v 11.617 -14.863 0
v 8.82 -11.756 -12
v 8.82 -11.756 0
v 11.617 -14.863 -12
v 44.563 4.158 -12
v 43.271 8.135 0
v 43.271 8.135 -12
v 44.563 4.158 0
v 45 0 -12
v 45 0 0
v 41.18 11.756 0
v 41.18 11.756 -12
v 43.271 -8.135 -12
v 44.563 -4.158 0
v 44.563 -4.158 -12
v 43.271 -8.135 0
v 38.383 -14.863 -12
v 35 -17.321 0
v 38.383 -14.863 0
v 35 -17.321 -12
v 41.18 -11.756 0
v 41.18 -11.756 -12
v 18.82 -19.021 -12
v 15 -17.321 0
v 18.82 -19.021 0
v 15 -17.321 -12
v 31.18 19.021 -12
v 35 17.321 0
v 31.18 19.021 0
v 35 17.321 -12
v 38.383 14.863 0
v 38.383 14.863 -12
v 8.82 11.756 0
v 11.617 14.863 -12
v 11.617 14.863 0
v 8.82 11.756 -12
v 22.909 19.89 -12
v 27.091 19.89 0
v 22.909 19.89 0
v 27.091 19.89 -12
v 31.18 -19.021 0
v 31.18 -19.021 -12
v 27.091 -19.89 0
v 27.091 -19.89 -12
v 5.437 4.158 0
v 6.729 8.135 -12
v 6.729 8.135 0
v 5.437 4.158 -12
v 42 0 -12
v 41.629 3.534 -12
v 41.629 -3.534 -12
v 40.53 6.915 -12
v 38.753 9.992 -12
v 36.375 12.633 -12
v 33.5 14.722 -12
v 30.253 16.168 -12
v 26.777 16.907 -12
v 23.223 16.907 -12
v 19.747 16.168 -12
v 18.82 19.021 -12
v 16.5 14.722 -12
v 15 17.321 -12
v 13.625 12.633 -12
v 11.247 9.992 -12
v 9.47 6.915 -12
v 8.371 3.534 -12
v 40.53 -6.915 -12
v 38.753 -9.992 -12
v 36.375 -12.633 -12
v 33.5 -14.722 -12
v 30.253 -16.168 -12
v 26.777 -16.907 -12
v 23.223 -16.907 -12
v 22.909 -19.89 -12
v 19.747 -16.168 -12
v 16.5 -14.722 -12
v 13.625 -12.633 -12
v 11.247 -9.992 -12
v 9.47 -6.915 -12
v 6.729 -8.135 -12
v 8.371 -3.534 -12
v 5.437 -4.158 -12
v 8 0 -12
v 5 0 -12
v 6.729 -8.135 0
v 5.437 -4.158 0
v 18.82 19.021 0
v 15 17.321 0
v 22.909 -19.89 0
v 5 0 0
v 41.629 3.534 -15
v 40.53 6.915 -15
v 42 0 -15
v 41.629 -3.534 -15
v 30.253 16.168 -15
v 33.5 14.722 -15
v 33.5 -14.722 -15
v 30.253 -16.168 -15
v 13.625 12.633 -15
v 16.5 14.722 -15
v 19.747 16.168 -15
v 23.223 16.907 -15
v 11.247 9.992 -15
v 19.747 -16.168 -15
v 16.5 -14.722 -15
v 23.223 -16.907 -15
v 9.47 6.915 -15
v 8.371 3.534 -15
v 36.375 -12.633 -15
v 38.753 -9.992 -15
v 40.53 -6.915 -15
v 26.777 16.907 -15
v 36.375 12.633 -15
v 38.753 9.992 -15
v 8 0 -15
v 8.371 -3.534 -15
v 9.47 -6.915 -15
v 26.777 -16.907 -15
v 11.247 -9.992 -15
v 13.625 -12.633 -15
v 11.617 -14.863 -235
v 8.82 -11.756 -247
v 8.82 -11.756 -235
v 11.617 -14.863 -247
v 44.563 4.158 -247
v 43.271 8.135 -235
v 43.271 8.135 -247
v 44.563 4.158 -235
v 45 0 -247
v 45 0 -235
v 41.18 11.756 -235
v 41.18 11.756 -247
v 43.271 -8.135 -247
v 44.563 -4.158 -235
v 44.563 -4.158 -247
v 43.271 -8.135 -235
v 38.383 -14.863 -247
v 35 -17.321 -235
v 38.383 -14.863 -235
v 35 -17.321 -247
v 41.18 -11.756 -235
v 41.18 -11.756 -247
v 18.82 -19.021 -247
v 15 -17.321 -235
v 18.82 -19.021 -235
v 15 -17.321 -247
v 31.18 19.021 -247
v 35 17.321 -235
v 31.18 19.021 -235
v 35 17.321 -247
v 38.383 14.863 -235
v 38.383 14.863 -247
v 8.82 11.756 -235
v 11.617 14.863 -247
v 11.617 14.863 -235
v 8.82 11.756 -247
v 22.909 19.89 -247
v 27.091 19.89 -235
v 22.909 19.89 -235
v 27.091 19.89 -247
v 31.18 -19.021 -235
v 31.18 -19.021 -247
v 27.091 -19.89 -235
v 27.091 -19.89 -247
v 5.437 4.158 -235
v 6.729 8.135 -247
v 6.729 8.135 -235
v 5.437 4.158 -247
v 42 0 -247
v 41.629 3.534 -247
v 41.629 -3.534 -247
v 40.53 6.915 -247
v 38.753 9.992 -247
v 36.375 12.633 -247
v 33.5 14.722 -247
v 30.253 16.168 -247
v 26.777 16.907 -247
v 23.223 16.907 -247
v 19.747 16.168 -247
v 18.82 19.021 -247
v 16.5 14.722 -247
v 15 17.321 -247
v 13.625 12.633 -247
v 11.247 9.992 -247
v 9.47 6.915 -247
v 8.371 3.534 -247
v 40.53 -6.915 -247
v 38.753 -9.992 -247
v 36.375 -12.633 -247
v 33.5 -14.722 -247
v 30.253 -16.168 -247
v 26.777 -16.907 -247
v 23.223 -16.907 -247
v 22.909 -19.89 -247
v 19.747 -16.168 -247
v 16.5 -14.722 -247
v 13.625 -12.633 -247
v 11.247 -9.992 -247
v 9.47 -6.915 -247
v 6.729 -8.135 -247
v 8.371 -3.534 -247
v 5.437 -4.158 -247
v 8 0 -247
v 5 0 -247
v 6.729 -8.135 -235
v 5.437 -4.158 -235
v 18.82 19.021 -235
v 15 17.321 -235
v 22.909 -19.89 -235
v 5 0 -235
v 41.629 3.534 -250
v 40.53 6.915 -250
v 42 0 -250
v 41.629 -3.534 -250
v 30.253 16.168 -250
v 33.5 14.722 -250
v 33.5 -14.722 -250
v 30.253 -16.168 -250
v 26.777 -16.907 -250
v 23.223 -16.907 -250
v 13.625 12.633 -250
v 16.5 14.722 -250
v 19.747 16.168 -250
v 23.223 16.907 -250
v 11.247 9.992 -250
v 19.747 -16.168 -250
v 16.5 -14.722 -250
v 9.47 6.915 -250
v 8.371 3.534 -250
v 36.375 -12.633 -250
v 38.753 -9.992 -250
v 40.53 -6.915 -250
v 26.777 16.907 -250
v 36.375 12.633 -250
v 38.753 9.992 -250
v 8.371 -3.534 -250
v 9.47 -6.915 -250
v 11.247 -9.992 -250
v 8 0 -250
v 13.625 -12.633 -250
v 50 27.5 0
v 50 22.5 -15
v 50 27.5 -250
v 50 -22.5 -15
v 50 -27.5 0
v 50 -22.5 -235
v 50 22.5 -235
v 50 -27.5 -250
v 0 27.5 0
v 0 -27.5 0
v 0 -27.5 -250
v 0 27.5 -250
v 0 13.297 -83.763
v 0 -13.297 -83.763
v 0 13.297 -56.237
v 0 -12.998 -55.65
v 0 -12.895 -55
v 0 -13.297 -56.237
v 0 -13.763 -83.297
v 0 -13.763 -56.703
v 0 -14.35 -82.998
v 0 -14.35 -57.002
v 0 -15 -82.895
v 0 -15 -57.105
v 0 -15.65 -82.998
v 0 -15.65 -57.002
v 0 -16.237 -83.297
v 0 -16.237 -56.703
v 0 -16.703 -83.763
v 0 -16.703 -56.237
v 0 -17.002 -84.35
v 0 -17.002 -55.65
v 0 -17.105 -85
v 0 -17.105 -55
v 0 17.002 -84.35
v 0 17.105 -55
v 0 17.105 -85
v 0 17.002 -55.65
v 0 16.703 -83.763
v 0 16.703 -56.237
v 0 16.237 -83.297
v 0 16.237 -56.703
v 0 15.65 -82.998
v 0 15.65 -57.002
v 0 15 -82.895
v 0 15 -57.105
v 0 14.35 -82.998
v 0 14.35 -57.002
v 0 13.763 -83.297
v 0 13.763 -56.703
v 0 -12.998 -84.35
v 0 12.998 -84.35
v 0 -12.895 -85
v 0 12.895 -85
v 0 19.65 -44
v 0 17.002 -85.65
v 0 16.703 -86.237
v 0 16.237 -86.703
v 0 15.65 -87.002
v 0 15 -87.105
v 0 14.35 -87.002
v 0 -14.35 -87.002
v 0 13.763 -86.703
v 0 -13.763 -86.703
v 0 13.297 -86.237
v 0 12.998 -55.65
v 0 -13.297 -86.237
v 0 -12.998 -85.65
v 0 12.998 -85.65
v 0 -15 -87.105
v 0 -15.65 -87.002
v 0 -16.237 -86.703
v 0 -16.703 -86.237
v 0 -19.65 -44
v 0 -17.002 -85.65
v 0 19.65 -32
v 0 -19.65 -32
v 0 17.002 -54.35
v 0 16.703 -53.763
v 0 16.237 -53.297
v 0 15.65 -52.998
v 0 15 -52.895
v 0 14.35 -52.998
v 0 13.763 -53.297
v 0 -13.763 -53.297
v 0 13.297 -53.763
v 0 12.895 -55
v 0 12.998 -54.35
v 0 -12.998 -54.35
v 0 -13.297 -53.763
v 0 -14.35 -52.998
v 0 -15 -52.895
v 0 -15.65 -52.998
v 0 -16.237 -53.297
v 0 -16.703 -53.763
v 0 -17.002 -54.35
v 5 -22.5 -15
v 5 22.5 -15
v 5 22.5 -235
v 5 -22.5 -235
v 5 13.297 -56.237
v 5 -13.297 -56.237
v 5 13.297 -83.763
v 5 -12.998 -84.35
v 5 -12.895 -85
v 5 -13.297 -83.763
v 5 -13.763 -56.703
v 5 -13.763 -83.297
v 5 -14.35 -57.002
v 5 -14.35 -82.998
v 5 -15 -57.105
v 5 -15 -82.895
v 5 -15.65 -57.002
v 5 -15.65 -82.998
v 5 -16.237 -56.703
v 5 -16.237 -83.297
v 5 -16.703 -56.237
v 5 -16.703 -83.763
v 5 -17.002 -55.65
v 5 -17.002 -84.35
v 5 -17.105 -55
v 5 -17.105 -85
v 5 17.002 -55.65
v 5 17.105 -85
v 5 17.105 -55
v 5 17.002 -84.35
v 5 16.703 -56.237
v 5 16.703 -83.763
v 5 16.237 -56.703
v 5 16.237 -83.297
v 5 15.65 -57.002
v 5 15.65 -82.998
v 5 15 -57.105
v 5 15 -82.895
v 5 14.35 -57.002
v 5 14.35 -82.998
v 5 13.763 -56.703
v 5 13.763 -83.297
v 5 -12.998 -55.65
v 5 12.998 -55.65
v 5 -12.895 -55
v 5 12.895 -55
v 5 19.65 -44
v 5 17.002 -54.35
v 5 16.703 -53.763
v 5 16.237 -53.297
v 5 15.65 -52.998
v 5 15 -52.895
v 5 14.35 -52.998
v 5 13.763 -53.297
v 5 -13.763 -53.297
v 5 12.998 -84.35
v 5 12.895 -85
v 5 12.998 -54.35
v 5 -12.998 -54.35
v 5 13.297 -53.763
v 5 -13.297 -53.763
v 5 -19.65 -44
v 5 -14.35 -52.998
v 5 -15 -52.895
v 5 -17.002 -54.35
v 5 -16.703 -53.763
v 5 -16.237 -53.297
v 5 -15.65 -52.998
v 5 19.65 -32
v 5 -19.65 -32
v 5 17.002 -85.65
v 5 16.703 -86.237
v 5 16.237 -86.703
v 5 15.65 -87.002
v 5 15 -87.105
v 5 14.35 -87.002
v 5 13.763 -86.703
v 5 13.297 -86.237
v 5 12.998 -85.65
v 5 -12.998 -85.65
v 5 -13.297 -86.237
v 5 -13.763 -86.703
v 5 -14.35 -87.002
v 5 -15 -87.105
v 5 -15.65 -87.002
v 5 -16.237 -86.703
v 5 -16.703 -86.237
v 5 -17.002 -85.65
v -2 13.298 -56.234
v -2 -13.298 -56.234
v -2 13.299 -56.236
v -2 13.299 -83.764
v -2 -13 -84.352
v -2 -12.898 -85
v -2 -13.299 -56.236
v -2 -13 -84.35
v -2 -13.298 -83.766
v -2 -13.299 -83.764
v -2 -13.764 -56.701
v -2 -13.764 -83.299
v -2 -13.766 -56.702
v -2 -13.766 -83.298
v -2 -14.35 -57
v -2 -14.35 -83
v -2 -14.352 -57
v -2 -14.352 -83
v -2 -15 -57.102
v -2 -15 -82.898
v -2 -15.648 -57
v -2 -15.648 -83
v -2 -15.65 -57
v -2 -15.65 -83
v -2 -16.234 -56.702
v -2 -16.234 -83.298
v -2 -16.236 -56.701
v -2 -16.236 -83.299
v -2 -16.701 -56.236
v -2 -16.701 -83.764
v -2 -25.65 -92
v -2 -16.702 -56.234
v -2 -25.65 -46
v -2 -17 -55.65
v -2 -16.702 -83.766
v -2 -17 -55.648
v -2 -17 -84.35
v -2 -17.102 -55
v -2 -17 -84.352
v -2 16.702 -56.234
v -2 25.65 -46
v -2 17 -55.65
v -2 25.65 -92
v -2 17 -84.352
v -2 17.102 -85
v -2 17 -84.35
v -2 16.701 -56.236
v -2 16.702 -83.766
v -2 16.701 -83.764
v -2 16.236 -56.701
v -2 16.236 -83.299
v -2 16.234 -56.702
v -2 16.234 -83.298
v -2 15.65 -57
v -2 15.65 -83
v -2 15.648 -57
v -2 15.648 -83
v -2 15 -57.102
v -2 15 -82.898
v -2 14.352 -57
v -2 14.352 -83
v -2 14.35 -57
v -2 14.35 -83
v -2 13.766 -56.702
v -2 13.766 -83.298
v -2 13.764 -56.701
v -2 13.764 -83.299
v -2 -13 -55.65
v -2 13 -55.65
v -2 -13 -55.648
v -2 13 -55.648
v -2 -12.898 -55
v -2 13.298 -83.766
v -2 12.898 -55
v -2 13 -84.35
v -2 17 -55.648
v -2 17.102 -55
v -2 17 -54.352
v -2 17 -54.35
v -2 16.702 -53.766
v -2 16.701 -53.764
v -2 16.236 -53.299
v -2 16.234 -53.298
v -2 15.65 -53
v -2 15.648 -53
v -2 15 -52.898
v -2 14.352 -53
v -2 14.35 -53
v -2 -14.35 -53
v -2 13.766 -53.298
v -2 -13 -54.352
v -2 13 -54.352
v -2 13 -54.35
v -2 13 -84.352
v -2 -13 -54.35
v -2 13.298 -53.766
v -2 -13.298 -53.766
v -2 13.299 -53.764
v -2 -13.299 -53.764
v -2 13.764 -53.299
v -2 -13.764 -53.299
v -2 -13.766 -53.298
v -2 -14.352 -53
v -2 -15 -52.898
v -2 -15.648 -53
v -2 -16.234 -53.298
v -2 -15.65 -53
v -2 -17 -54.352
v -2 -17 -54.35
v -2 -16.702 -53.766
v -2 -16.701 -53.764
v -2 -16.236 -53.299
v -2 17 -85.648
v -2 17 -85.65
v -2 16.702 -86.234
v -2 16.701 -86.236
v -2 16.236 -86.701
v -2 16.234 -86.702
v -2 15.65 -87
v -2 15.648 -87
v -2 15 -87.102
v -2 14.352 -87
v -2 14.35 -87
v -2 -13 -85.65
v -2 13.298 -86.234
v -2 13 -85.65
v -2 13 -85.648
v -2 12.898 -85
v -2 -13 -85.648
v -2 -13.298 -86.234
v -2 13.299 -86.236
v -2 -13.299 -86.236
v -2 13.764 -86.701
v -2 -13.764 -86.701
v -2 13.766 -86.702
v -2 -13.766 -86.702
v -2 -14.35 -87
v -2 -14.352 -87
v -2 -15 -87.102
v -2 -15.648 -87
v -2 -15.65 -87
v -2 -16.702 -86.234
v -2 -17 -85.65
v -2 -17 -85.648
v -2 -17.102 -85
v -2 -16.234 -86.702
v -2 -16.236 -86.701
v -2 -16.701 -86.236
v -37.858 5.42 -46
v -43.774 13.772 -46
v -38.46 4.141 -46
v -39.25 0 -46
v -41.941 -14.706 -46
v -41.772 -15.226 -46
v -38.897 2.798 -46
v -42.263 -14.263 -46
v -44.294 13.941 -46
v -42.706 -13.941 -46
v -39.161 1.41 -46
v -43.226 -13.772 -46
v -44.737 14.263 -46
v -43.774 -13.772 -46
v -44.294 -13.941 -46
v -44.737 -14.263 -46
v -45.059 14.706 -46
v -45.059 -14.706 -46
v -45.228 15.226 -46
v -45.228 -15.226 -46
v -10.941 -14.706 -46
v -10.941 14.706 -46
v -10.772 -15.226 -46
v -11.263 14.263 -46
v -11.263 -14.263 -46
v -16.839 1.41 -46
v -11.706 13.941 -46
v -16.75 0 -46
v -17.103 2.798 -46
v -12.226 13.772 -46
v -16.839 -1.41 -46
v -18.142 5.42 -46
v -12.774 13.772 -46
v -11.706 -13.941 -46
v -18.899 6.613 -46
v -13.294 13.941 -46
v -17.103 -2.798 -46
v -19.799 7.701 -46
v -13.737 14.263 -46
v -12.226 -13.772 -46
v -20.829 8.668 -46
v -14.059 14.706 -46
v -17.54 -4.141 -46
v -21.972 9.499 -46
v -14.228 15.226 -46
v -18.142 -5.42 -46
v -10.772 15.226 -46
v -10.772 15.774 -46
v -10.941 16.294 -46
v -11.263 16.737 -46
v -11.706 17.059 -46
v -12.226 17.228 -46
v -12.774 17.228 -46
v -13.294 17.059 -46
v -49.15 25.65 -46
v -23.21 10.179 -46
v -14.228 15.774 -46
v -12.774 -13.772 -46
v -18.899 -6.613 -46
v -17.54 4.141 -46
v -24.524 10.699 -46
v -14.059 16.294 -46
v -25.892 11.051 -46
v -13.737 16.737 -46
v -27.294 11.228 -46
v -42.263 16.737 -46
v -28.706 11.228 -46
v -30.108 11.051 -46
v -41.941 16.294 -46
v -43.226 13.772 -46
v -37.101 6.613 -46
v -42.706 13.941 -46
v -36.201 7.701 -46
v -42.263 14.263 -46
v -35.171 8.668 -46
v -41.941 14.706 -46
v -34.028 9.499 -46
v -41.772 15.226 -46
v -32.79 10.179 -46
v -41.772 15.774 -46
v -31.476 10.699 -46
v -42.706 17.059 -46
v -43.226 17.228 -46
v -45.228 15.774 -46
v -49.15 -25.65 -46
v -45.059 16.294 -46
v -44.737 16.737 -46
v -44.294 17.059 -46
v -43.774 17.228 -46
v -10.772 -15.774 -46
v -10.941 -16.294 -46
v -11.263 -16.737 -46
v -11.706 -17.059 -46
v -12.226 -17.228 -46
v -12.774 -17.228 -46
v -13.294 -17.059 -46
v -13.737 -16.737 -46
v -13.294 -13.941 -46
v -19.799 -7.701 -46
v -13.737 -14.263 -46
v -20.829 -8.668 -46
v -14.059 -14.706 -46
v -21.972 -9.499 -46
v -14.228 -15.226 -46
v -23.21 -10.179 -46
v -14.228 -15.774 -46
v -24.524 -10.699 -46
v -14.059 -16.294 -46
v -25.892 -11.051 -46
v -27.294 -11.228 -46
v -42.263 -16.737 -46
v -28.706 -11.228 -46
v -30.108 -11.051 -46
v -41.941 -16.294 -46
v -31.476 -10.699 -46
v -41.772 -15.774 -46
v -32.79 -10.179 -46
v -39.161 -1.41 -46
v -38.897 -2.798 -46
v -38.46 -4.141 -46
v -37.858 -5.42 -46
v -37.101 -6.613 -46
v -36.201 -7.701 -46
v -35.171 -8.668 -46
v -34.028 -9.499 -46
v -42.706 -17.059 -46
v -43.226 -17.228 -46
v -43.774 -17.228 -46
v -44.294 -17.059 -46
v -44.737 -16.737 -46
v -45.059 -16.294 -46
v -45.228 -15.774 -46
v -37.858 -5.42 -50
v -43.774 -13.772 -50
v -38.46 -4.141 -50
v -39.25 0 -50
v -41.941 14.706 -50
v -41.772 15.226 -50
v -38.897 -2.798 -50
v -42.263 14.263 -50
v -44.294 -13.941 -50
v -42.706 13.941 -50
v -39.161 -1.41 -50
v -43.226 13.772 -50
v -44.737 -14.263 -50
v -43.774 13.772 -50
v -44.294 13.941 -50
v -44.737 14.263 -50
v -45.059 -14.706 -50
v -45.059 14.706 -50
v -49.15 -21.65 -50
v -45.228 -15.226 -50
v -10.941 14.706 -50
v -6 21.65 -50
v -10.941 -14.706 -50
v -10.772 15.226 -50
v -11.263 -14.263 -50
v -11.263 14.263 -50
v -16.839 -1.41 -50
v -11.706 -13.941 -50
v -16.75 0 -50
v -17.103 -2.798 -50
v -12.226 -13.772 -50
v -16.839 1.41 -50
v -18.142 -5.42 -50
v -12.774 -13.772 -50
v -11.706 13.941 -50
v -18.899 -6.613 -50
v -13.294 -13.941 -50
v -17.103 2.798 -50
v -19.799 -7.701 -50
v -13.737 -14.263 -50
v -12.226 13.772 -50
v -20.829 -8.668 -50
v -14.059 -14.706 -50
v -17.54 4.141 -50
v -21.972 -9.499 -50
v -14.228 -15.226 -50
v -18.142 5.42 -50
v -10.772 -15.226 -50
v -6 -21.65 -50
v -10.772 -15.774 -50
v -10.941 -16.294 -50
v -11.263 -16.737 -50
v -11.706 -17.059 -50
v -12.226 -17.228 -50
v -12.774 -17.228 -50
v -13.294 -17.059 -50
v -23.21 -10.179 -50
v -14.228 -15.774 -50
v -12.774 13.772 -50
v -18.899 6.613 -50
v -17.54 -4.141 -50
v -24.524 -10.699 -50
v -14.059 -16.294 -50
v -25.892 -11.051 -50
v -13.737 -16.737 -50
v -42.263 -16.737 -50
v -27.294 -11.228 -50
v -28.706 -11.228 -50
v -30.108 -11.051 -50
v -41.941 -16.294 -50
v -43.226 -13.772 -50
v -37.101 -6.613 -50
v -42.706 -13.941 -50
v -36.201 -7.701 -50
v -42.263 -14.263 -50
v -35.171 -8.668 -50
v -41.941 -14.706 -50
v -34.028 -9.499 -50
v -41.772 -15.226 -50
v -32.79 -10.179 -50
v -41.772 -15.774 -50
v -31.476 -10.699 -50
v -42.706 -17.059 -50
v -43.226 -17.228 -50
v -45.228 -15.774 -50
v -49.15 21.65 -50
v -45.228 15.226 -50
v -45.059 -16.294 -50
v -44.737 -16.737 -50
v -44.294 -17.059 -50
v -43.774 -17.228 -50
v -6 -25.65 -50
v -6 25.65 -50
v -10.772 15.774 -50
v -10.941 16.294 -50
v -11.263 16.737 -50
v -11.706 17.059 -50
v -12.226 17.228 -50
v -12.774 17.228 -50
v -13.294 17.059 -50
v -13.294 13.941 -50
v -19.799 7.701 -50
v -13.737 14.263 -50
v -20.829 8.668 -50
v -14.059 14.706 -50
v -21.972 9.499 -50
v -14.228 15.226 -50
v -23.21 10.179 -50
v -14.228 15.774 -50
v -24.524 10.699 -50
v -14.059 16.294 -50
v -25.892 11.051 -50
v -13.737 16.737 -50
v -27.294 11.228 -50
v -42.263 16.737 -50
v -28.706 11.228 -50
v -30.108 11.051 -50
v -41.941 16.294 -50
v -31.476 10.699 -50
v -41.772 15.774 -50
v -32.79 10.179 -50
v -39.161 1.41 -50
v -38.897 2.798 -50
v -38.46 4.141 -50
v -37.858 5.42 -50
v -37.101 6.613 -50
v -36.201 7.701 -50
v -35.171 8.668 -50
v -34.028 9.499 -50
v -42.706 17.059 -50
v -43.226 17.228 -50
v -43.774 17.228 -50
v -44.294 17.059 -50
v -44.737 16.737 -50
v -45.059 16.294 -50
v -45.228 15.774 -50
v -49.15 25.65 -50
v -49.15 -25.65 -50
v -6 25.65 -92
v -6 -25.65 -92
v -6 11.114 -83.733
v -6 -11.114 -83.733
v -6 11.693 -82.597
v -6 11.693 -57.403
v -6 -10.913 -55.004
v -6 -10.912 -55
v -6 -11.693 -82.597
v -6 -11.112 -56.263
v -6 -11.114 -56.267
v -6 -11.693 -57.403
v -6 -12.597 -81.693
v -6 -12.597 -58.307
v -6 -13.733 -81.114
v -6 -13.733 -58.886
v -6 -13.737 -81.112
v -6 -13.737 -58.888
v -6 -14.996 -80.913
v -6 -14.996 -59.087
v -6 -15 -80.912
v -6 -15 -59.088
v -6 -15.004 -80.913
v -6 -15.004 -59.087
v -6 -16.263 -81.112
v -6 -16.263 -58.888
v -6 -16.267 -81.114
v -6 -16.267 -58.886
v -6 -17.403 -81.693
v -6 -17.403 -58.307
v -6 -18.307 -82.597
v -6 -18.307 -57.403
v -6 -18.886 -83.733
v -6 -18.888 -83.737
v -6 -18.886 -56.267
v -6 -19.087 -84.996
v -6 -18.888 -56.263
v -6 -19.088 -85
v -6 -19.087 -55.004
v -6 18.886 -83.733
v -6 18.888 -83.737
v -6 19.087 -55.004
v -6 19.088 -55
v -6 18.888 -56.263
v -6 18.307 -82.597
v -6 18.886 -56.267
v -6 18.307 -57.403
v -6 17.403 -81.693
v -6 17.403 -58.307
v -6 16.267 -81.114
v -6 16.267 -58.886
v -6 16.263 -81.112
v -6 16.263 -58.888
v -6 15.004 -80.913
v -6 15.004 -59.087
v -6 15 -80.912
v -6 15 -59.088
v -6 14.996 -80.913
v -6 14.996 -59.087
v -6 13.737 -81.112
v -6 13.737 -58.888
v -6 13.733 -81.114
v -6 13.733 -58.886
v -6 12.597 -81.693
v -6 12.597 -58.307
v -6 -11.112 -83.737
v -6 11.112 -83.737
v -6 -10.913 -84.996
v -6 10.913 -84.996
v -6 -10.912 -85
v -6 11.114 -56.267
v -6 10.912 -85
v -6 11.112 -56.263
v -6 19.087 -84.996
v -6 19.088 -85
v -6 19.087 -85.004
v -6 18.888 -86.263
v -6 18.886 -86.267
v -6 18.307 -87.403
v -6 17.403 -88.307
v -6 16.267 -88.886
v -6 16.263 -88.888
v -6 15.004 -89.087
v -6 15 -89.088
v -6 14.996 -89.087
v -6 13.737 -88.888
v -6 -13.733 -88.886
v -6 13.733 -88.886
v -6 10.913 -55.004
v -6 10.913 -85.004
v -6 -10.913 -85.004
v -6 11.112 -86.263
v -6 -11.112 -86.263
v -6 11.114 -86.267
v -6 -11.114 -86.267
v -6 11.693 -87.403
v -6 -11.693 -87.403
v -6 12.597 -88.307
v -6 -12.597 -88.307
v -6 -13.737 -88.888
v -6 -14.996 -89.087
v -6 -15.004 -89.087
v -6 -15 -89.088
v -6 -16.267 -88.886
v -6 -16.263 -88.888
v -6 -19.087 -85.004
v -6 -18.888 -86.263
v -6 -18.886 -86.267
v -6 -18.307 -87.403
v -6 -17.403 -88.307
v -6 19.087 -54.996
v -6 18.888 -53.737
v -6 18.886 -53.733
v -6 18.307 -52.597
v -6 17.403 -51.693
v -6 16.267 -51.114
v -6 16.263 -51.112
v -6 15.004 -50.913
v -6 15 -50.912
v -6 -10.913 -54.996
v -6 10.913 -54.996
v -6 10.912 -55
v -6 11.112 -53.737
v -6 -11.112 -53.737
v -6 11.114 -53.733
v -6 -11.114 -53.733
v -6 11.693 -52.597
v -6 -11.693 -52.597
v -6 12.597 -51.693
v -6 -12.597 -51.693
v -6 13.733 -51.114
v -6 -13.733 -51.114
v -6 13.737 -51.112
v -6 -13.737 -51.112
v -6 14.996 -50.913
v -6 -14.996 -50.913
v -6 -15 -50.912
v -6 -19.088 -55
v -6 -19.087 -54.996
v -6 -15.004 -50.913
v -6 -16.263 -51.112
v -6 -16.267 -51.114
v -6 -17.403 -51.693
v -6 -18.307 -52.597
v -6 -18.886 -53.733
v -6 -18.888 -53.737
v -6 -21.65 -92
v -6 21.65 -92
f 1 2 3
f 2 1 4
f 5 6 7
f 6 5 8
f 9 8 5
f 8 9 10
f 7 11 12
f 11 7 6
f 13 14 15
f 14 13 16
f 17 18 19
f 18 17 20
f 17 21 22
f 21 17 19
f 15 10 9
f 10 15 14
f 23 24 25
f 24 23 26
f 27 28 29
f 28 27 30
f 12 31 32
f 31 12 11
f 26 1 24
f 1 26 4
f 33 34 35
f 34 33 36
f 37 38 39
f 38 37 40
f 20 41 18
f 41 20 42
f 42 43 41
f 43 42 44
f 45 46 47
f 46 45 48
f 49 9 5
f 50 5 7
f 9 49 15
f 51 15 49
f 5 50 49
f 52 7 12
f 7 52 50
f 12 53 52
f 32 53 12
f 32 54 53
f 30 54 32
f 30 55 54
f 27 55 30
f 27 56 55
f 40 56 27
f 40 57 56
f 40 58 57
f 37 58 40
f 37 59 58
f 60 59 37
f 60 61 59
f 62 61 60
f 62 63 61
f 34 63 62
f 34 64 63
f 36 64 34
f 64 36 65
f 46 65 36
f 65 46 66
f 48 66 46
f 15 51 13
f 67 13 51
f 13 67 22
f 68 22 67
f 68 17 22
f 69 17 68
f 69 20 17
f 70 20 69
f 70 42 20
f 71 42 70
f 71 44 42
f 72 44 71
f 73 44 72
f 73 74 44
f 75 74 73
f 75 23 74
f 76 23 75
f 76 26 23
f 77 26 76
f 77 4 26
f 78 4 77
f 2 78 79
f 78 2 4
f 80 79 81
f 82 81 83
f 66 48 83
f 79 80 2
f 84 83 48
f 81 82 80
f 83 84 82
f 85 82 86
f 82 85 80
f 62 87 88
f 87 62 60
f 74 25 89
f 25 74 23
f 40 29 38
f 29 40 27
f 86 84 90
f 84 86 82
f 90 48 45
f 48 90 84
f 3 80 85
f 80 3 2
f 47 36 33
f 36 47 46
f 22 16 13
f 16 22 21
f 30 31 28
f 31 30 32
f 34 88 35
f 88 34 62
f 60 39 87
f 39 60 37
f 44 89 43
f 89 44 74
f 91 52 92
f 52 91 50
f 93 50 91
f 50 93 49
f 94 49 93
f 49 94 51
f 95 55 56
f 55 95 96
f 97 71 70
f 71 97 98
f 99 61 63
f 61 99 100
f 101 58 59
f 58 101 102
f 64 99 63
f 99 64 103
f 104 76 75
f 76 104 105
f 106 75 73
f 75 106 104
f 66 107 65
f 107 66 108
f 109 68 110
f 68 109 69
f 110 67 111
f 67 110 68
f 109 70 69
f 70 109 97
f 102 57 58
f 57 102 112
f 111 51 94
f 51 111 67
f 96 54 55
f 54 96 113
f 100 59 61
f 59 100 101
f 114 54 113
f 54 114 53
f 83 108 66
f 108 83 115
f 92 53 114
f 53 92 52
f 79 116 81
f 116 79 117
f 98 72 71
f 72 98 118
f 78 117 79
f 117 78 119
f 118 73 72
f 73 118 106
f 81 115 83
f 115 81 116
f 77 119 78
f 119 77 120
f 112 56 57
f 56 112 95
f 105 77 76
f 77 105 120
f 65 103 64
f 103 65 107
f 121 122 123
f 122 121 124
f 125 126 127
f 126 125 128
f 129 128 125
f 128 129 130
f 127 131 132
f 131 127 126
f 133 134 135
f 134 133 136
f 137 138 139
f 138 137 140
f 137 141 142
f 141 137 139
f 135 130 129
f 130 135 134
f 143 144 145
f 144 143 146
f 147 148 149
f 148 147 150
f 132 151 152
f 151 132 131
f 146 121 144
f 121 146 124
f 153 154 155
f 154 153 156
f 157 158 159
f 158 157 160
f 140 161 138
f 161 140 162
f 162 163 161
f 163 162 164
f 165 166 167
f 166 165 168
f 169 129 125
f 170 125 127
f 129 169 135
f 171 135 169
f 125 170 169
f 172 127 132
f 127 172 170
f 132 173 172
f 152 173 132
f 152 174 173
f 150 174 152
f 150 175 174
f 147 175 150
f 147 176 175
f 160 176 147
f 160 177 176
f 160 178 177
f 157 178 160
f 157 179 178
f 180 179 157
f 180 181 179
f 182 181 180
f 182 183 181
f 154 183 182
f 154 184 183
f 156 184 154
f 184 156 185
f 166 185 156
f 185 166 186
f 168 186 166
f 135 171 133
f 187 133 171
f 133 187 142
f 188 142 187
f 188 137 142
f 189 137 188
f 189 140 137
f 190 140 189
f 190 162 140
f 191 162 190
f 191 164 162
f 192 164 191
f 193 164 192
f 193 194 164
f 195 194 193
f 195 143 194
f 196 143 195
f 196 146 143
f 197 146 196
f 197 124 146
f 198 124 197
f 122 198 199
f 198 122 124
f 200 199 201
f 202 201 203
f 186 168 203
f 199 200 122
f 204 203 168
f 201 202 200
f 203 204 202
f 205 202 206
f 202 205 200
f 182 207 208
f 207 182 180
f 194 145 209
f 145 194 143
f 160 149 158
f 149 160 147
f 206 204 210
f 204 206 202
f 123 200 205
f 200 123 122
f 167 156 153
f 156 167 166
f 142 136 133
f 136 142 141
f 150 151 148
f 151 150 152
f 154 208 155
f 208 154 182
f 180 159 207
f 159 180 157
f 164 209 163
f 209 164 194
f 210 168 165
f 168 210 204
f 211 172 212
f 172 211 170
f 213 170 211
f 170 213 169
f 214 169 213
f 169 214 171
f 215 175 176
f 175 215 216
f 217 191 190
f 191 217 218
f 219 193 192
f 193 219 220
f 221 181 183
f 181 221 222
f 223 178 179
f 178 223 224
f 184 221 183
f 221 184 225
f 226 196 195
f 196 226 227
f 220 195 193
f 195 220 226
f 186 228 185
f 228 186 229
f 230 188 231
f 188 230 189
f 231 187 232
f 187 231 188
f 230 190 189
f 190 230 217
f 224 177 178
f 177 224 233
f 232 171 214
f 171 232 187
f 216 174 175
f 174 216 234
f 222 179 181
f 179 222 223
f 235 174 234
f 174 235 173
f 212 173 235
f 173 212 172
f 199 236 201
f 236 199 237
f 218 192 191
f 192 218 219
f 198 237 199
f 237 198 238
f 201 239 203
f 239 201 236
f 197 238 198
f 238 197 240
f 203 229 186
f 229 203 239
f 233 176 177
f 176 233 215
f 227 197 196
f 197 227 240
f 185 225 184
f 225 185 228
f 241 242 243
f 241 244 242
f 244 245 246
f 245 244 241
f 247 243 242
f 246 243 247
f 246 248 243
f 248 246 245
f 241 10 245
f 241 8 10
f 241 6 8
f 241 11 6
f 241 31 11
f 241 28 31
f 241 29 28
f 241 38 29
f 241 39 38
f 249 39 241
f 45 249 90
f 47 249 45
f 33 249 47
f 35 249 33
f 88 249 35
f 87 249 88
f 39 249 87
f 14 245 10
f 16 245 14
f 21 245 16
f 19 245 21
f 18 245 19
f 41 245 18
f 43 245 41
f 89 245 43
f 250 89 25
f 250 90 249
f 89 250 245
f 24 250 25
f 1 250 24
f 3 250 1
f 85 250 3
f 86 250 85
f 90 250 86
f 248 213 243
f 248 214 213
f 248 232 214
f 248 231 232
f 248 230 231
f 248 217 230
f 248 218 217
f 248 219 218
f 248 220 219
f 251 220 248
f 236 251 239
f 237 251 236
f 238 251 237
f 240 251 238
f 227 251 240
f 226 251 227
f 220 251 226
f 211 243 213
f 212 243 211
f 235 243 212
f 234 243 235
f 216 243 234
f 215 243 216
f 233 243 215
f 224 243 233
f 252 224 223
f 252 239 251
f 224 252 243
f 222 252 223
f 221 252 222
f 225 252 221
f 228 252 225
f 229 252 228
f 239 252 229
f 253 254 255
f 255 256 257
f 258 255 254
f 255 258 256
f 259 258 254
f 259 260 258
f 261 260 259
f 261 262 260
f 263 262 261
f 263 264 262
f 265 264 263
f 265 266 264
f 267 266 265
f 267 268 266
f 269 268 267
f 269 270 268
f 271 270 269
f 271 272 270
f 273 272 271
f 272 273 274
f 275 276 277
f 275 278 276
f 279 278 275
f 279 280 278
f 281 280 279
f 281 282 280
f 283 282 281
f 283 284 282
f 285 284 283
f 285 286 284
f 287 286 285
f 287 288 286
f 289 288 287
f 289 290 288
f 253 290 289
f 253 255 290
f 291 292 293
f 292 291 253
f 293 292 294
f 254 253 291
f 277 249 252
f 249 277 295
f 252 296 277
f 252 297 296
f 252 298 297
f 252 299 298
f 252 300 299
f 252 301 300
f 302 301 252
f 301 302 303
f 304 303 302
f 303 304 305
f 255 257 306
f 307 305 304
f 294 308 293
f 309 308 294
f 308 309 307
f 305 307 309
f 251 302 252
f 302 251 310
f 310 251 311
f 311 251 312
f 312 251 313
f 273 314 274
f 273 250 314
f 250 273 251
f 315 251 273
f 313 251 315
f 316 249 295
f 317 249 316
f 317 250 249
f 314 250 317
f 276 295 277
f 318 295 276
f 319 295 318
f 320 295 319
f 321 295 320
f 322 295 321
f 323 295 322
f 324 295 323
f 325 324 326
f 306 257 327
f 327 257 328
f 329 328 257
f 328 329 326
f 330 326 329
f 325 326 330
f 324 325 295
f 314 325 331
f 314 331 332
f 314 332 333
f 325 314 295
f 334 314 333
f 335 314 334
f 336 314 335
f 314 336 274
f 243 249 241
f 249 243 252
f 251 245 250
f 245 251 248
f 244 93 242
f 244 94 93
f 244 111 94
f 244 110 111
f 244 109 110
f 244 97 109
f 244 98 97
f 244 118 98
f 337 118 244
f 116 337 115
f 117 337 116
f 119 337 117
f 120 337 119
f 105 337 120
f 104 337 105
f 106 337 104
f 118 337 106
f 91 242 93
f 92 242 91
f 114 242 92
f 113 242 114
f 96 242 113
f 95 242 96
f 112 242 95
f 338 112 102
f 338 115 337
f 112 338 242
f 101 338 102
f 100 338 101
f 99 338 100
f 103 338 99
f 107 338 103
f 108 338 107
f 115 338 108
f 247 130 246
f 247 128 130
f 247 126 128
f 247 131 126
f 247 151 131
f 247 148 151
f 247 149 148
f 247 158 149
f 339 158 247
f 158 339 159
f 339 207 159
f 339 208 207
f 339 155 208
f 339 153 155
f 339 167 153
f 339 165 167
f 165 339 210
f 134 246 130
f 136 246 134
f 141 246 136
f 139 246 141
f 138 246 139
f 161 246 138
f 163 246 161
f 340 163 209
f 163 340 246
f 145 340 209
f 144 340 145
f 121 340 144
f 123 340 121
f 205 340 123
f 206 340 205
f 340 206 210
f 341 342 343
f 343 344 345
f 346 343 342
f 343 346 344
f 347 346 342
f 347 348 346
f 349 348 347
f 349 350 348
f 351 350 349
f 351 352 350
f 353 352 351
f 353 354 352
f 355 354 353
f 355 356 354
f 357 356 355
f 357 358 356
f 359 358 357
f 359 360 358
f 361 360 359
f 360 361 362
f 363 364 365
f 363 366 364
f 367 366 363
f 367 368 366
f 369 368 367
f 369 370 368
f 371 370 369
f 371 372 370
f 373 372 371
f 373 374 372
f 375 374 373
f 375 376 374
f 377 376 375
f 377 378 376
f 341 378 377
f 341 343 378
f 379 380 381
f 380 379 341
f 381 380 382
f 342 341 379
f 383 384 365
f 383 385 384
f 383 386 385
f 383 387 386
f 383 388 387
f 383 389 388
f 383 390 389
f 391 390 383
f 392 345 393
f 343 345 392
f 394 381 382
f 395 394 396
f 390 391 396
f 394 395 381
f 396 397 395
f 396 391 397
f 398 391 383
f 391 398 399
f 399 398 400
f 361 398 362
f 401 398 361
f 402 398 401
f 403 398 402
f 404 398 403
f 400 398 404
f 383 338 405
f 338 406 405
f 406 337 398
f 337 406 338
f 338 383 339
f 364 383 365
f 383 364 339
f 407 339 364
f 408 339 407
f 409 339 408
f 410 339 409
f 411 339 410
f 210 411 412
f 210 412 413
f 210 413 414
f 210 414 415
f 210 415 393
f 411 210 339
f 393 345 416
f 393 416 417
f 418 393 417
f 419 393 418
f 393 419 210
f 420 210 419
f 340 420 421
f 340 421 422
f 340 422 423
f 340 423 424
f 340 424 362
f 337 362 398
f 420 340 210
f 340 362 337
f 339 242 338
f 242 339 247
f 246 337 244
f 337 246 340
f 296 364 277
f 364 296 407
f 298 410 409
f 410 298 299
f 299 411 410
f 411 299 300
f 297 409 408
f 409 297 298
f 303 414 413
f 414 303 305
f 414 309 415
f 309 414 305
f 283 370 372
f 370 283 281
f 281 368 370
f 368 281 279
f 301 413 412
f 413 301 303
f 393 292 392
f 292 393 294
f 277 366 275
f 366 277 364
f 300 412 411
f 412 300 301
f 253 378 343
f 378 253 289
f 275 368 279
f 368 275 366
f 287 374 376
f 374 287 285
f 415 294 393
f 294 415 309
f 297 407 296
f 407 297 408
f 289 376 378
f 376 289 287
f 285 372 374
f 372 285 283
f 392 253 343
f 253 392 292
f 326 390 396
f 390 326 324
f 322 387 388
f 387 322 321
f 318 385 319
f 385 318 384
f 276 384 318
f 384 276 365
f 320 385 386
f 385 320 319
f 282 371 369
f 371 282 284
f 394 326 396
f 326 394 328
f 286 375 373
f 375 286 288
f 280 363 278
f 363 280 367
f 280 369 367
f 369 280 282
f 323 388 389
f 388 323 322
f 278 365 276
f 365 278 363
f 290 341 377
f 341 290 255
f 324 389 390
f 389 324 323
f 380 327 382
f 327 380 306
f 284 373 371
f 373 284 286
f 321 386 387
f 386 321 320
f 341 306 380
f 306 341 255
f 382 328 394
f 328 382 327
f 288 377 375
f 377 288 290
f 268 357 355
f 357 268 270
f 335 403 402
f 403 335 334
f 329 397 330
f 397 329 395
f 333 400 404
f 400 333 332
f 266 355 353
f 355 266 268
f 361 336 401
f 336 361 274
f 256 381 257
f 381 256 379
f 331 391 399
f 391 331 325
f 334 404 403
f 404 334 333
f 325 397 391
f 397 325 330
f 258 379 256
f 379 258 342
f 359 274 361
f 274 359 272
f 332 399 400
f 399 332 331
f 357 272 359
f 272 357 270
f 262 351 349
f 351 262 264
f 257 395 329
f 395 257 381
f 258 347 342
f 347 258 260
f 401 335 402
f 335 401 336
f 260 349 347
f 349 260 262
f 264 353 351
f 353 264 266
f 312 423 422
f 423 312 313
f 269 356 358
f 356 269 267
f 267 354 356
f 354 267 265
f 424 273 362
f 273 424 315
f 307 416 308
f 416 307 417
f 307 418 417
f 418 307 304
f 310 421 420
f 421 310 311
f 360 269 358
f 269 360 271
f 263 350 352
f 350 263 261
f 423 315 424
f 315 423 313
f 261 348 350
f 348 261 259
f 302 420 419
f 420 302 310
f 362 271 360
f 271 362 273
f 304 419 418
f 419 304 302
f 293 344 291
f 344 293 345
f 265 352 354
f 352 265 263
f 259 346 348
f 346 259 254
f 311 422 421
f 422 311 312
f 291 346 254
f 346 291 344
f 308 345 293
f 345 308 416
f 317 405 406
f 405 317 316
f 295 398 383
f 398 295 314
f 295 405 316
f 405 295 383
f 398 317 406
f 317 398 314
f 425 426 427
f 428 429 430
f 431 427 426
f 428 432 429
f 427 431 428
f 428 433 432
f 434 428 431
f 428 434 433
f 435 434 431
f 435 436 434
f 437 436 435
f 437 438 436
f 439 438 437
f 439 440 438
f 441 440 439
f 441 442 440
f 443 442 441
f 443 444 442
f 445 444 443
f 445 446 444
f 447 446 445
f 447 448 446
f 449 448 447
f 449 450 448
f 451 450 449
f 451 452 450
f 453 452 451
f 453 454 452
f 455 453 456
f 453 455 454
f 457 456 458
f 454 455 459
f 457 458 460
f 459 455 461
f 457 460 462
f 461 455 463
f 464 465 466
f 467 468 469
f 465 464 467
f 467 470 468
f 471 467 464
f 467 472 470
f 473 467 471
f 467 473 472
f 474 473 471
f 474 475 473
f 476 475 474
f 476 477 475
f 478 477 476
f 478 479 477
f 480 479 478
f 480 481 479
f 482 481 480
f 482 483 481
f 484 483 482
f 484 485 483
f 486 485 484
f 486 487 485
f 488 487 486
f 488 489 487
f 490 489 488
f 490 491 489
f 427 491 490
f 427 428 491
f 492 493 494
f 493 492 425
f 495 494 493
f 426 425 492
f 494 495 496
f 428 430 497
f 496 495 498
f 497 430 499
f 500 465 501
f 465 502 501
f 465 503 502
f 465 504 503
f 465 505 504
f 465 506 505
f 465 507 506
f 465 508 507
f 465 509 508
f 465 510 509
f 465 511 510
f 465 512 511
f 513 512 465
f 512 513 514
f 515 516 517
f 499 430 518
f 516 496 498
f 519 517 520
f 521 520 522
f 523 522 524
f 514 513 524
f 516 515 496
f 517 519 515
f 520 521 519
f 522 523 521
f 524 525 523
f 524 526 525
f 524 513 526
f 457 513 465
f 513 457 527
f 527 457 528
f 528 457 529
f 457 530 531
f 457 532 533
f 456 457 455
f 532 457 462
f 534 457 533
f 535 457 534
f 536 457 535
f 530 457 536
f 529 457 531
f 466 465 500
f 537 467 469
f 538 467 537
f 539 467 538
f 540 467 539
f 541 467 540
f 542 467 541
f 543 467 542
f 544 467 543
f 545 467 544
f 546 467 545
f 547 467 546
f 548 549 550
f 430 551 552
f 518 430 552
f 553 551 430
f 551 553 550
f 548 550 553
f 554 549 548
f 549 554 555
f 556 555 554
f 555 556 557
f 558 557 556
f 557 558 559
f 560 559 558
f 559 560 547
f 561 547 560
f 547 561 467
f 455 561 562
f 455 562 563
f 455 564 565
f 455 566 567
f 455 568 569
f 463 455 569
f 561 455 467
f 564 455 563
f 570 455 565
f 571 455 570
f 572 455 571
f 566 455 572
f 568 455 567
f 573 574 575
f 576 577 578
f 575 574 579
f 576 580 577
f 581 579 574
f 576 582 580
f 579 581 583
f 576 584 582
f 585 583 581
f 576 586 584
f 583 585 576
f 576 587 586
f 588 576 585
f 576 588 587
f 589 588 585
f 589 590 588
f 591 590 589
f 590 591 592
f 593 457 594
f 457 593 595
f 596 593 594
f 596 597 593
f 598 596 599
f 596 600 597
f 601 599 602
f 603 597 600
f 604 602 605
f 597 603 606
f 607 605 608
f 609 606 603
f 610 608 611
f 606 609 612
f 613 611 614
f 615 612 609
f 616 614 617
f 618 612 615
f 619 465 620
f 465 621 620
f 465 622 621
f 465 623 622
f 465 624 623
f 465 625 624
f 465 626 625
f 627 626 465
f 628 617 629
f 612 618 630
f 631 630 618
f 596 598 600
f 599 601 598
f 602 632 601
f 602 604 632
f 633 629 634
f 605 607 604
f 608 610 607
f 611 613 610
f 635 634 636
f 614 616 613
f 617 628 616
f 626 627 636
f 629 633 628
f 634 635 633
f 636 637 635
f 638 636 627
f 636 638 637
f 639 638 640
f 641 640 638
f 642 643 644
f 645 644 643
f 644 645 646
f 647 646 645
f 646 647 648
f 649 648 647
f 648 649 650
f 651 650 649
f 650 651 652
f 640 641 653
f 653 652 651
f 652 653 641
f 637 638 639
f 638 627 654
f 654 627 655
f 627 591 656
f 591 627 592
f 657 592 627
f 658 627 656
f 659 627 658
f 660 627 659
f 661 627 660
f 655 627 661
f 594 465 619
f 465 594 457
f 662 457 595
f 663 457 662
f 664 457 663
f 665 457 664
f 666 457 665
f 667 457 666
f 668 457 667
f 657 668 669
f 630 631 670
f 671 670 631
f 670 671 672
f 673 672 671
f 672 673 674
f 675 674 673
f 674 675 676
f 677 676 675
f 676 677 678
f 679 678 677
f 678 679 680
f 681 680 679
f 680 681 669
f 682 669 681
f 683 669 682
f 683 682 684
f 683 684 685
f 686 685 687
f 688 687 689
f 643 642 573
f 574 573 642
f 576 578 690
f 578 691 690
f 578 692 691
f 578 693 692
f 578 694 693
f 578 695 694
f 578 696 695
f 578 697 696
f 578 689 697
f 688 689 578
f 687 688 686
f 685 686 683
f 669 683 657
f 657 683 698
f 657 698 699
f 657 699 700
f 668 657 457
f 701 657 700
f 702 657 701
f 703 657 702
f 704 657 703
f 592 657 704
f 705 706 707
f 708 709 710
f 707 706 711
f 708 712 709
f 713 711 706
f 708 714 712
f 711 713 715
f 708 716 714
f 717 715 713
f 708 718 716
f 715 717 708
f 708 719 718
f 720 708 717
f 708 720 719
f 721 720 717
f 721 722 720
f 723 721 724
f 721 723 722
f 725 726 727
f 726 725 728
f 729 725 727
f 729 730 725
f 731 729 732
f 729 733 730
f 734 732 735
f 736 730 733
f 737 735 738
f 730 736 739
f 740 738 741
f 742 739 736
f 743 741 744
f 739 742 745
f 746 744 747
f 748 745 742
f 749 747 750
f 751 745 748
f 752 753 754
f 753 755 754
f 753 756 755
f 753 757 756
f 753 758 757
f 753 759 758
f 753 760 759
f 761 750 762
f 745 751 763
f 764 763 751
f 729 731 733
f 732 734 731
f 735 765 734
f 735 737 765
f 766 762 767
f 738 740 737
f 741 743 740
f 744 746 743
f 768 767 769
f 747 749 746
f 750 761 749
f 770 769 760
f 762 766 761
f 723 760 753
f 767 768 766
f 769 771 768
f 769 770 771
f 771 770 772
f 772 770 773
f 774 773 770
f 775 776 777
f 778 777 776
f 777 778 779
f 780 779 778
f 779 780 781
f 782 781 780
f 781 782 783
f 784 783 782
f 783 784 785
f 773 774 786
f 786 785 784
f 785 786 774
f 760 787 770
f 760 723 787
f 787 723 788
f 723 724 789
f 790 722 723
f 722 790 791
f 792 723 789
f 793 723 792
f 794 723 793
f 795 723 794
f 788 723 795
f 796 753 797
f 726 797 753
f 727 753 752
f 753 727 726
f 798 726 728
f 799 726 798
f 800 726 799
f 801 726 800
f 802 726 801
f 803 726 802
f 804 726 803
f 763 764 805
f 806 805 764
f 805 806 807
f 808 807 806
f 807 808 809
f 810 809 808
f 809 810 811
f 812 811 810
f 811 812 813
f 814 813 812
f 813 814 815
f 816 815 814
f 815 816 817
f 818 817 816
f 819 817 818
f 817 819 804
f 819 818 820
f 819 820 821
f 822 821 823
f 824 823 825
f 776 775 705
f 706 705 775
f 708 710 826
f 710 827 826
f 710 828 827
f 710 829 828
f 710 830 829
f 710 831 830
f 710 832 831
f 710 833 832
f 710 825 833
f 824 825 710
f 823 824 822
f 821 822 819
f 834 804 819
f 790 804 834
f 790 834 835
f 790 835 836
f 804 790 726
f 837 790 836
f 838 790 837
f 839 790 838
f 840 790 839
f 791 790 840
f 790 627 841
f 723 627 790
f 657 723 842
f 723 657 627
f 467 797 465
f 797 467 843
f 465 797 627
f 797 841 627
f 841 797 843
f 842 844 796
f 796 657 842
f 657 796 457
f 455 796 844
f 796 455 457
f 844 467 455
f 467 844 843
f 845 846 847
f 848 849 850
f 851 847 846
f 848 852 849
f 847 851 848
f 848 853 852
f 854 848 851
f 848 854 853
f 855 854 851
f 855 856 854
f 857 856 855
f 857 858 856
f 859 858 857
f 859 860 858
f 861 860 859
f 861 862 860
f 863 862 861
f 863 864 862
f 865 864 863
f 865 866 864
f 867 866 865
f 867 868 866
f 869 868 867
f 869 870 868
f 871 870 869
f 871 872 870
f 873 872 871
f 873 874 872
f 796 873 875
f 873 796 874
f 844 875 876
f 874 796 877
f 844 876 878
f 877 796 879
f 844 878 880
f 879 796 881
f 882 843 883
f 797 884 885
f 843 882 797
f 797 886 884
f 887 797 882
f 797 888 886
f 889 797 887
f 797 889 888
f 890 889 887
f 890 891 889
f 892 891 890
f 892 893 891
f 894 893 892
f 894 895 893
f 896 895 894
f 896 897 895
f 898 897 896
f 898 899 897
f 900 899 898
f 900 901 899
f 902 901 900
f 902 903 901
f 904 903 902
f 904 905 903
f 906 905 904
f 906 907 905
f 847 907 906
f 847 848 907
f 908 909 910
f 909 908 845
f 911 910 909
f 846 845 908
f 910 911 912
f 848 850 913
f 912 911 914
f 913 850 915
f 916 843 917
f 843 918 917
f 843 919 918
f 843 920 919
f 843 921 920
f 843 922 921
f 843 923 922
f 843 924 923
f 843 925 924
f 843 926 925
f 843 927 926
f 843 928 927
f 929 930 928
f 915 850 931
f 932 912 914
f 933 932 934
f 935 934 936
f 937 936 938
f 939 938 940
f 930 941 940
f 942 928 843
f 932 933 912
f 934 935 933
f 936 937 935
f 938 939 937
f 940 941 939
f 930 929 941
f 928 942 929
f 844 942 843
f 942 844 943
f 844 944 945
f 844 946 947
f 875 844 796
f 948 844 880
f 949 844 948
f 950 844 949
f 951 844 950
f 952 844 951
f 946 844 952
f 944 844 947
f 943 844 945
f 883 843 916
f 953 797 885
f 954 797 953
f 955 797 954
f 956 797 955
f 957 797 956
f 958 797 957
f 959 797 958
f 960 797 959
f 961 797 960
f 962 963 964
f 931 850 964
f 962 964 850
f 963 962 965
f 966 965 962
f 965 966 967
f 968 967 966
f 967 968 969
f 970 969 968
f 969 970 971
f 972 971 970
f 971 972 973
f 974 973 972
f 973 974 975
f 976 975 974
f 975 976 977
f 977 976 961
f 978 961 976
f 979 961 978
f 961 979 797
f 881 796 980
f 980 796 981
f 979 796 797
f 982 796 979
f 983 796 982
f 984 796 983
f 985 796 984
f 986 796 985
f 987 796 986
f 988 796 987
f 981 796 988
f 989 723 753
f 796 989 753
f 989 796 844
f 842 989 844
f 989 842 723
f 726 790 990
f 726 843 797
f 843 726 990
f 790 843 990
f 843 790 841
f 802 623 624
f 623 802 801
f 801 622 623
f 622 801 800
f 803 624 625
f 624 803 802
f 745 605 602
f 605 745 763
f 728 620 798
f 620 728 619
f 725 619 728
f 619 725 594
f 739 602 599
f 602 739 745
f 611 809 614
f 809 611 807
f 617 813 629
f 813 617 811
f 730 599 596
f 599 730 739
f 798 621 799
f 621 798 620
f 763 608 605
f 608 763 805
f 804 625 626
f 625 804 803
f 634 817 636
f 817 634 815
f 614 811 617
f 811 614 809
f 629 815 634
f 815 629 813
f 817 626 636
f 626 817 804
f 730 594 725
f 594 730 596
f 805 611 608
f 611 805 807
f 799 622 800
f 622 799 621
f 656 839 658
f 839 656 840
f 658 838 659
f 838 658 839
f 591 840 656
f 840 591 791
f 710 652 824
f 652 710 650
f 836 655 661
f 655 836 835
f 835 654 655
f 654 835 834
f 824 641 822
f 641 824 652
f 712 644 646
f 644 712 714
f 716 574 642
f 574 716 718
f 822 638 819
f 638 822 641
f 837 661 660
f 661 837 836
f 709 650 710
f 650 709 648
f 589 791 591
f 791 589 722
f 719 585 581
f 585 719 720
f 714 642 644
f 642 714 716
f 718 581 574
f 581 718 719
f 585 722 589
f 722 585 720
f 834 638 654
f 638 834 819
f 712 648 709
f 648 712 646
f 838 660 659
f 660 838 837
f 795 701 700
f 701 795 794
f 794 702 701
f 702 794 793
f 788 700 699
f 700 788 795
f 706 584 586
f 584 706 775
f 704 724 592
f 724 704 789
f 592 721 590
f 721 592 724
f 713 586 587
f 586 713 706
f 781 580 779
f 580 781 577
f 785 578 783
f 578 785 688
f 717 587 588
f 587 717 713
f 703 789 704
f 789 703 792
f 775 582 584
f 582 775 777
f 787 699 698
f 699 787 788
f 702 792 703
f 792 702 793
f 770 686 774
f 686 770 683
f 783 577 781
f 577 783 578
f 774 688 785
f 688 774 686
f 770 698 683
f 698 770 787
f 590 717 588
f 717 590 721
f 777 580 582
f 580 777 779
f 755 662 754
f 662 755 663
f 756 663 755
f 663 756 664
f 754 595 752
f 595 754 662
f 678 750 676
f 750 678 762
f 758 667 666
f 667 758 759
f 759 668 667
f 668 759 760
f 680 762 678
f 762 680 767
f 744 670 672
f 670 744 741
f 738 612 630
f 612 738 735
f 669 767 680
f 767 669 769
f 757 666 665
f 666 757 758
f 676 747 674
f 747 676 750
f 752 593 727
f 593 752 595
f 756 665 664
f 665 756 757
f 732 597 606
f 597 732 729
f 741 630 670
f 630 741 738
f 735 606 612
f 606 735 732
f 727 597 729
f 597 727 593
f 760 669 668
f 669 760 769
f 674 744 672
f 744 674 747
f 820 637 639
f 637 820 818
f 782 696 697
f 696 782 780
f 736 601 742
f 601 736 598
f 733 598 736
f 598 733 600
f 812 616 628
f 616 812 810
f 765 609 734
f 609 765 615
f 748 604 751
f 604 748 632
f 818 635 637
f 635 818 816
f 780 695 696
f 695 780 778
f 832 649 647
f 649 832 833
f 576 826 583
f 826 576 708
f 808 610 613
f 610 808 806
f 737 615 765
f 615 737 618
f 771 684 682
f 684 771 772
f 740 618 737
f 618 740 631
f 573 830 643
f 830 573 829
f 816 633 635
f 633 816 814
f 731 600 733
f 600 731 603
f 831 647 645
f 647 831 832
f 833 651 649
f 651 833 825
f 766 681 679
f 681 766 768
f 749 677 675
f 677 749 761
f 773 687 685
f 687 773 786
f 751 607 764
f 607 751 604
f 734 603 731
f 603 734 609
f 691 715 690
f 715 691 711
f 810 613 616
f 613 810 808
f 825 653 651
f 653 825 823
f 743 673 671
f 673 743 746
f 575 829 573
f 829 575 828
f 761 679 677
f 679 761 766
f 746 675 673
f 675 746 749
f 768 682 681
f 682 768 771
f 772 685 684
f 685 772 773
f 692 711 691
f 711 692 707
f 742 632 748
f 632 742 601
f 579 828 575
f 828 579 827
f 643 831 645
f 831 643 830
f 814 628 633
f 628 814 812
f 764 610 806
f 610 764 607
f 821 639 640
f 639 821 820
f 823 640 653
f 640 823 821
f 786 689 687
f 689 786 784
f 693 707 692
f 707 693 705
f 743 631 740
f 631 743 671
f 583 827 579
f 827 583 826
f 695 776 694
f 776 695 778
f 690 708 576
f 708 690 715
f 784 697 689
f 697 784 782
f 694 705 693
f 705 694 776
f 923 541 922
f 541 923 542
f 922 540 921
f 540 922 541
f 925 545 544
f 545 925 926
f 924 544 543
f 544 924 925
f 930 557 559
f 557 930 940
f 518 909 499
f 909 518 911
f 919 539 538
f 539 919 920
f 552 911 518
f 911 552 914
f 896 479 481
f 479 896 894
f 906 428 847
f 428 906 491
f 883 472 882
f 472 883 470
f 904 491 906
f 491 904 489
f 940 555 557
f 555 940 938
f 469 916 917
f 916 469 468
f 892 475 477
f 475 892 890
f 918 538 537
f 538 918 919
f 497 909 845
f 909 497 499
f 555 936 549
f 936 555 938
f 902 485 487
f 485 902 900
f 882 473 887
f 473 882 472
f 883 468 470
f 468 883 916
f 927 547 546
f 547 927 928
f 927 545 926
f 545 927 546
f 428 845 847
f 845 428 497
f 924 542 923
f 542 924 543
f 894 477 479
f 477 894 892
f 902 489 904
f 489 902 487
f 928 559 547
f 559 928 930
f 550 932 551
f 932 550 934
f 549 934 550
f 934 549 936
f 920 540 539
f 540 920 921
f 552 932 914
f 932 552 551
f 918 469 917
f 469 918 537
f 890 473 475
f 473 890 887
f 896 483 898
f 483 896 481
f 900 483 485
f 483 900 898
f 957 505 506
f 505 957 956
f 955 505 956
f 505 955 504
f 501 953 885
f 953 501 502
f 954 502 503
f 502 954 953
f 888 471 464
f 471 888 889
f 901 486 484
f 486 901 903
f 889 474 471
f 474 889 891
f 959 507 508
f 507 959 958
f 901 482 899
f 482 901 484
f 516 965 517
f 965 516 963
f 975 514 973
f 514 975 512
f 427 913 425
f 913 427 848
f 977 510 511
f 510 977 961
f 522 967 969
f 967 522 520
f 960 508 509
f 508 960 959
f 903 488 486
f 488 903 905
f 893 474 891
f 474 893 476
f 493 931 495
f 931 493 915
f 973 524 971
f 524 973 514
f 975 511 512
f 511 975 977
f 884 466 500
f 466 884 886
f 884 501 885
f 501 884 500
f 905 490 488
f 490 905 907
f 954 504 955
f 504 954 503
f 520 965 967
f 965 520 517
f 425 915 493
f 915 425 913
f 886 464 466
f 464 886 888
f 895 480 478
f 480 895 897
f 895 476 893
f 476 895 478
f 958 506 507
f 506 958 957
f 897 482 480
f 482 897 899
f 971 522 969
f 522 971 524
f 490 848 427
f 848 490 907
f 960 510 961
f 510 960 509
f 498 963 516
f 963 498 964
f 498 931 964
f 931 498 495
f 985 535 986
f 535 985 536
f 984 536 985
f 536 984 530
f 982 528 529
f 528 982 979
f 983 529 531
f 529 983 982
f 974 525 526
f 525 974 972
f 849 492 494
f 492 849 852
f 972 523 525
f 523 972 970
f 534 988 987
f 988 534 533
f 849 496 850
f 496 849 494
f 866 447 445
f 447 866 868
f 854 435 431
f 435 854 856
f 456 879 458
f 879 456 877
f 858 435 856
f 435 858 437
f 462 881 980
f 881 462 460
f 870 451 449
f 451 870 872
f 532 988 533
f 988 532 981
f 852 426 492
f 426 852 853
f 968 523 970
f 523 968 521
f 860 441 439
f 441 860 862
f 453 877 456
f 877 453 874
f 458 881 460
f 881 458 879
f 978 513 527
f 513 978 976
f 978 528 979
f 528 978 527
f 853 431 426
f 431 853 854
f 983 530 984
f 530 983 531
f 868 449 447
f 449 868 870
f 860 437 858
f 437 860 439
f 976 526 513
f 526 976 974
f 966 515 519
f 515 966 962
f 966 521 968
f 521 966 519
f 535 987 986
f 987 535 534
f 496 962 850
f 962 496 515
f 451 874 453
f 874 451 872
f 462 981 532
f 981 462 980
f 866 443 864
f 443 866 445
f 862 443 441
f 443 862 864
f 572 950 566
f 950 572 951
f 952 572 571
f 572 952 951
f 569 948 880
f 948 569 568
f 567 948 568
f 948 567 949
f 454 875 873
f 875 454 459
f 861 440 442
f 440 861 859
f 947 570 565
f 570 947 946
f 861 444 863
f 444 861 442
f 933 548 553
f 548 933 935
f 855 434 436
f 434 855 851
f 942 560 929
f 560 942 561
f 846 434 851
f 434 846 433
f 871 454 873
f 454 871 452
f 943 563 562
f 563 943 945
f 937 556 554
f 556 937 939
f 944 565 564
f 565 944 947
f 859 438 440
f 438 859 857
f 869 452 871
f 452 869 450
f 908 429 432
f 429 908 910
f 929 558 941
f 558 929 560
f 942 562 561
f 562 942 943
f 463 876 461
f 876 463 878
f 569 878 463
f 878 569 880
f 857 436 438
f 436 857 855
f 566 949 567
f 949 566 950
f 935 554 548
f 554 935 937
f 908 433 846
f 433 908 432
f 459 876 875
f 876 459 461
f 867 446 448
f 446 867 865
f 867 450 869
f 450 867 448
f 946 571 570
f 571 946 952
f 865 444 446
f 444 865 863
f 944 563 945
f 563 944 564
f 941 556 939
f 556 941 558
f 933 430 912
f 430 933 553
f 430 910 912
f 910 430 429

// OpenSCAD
x = 50;
y = 55;
h = 250;
wall = 5;

tiny = 0.01;

//NemaBracket(42,100,true);

shaftDistanceCenters = 51;

difference() {
  translate([x/2,0,0]) PoleBracket();
  translate([-tiny,0,-50]) NemaBracket(42, shaftDistanceCenters - x/2, true);
}

translate([-2,0,-50]) NemaBracket(42, shaftDistanceCenters - x/2);

module PoleBracket() {
  bearingH = 12;
  bearingDia = 40;
  bearingShelfH = 3;
  bearingLipT = 3;
  
  difference() {
    translate([0,0,-h/2]) cube([x,y,h], center=true);
    // Hollow out
    translate([wall,0,-h/2]) cube([x,y-wall*2,h-bearingH*2-bearingShelfH*2], center=true);
    // Bearings
    for (q=[0:1]) {
      z = q == 0 ? 0 : -h+bearingH+bearingShelfH;
      translate([0,0,z]) cylinder(d=bearingDia, h=bearingH*2, center=true);
      translate([0,0,z]) cylinder(d=bearingDia-bearingLipT*2, h=bearingH*4, center=true);
    }
  }
}

module NemaBracket(motorH=40, shaftFromEdge=30, mask=false) {
  pt = 4; // Plate thickness
  px = 42.3/2 + shaftFromEdge;
  py = 42.3 + pt*2 + 1;
  
  echo(shaftFromEdge, px, py);
  assert(shaftFromEdge > 42.3/2+pt, "Shaft from edge must be greate than half the motor size plase the plate thickness");
  
  translate([-px+42.3/2,0,0]) {
    difference() {
      union() {
        // Top plate
        translate([-42.3/2,-py/2,0]) cube([px,py,pt]);
        // Back plate
        translate([px-42.3/2-pt,-py/2,-motorH]) cube([pt,py,motorH]);
        // Sides
        sidePoints = [[0,0], [px-pt,0], [px-pt,motorH]];
        translate([-42.3/2,-py/2,0]) rotate([-90,0,0]) linear_extrude(pt) polygon(sidePoints);
        translate([-42.3/2,py/2-pt,0]) rotate([-90,0,0]) linear_extrude(pt) polygon(sidePoints);
      }
      // Stepper motor
      translate([0,0,-tiny]) NemaStepperMotor(motorH, true);
      // Fixing holes
      translate([px-42.3/2-pt/2,0,-20]) Fixings() cylinder(r1=8.2/2, r2=4.2/2, h=pt+tiny*3, $fn=20,center=true);
    }
    if (mask) {
      translate([px-42.3/2-pt/2,0,-20]) Fixings() cylinder(d=4.2+tiny, h=20, $fn=20,center=true);
      // Belt slot
      translate([42.3/2,0,24/2]) cube([px,py-12,12], center=true);
    }
  }
}

module Fixings() {
  rotate([0,90,0])
    for (m=[0:90:360])
      rotate([0,0,m]) 
        translate([15,15,-tiny])
          children();
}


//translate([50,0,0]) NemaStepperMotor();
//%NemaStepperMotor(40, true);

module NemaStepperMotor(h=40, mask=false) {
  w = 42.3;   // Width of the sides
  pt = 2;     // Round plate thickness
  pd = 22;    // Round plate diameter
  clearance = 0.5; // Clearance gets added to the mask
  boltDistanceCenters = 31;
  
  // Shaft
  translate([0,0,pt]) cylinder(d=5,h=24,$fn=20);
  // Round plate
  cylinder(d=pd,h=pt,$fn=50);
  // Body
  difference() {
    translate([-w/2,-w/2,-h]) cube([w,w,h]);
    // Chamfers
    for(m=[0:90:360])
      rotate([0,0,m])
        translate([-w/2,-w/2,-h/2]) rotate([0,0,45]) cube([5,5,h+pt+10], center=true);
    // Mounting holes
    for(m=[0:90:360])
      rotate([0,0,m])
        translate([31/2,31/2,-4.5-tiny]) rotate([0,0,45]) cylinder(d=3,h=4.5+tiny*2,$fn=20);
  }
  if (mask) {
    // Extend round plate
    cylinder(d=pd+clearance,h=pt*3,$fn=50);
    // Bolts
    for(m=[0:90:360])
      rotate([0,0,m]) {
        // Bolt
        translate([boltDistanceCenters/2,boltDistanceCenters/2,-tiny]) rotate([0,0,45]) cylinder(d=3+clearance,h=5.5+tiny,$fn=20);
        // Bolt head
        translate([boltDistanceCenters/2,boltDistanceCenters/2,5.5]) rotate([0,0,45]) cylinder(d=6,h=3,$fn=20);
      }
  }
}
